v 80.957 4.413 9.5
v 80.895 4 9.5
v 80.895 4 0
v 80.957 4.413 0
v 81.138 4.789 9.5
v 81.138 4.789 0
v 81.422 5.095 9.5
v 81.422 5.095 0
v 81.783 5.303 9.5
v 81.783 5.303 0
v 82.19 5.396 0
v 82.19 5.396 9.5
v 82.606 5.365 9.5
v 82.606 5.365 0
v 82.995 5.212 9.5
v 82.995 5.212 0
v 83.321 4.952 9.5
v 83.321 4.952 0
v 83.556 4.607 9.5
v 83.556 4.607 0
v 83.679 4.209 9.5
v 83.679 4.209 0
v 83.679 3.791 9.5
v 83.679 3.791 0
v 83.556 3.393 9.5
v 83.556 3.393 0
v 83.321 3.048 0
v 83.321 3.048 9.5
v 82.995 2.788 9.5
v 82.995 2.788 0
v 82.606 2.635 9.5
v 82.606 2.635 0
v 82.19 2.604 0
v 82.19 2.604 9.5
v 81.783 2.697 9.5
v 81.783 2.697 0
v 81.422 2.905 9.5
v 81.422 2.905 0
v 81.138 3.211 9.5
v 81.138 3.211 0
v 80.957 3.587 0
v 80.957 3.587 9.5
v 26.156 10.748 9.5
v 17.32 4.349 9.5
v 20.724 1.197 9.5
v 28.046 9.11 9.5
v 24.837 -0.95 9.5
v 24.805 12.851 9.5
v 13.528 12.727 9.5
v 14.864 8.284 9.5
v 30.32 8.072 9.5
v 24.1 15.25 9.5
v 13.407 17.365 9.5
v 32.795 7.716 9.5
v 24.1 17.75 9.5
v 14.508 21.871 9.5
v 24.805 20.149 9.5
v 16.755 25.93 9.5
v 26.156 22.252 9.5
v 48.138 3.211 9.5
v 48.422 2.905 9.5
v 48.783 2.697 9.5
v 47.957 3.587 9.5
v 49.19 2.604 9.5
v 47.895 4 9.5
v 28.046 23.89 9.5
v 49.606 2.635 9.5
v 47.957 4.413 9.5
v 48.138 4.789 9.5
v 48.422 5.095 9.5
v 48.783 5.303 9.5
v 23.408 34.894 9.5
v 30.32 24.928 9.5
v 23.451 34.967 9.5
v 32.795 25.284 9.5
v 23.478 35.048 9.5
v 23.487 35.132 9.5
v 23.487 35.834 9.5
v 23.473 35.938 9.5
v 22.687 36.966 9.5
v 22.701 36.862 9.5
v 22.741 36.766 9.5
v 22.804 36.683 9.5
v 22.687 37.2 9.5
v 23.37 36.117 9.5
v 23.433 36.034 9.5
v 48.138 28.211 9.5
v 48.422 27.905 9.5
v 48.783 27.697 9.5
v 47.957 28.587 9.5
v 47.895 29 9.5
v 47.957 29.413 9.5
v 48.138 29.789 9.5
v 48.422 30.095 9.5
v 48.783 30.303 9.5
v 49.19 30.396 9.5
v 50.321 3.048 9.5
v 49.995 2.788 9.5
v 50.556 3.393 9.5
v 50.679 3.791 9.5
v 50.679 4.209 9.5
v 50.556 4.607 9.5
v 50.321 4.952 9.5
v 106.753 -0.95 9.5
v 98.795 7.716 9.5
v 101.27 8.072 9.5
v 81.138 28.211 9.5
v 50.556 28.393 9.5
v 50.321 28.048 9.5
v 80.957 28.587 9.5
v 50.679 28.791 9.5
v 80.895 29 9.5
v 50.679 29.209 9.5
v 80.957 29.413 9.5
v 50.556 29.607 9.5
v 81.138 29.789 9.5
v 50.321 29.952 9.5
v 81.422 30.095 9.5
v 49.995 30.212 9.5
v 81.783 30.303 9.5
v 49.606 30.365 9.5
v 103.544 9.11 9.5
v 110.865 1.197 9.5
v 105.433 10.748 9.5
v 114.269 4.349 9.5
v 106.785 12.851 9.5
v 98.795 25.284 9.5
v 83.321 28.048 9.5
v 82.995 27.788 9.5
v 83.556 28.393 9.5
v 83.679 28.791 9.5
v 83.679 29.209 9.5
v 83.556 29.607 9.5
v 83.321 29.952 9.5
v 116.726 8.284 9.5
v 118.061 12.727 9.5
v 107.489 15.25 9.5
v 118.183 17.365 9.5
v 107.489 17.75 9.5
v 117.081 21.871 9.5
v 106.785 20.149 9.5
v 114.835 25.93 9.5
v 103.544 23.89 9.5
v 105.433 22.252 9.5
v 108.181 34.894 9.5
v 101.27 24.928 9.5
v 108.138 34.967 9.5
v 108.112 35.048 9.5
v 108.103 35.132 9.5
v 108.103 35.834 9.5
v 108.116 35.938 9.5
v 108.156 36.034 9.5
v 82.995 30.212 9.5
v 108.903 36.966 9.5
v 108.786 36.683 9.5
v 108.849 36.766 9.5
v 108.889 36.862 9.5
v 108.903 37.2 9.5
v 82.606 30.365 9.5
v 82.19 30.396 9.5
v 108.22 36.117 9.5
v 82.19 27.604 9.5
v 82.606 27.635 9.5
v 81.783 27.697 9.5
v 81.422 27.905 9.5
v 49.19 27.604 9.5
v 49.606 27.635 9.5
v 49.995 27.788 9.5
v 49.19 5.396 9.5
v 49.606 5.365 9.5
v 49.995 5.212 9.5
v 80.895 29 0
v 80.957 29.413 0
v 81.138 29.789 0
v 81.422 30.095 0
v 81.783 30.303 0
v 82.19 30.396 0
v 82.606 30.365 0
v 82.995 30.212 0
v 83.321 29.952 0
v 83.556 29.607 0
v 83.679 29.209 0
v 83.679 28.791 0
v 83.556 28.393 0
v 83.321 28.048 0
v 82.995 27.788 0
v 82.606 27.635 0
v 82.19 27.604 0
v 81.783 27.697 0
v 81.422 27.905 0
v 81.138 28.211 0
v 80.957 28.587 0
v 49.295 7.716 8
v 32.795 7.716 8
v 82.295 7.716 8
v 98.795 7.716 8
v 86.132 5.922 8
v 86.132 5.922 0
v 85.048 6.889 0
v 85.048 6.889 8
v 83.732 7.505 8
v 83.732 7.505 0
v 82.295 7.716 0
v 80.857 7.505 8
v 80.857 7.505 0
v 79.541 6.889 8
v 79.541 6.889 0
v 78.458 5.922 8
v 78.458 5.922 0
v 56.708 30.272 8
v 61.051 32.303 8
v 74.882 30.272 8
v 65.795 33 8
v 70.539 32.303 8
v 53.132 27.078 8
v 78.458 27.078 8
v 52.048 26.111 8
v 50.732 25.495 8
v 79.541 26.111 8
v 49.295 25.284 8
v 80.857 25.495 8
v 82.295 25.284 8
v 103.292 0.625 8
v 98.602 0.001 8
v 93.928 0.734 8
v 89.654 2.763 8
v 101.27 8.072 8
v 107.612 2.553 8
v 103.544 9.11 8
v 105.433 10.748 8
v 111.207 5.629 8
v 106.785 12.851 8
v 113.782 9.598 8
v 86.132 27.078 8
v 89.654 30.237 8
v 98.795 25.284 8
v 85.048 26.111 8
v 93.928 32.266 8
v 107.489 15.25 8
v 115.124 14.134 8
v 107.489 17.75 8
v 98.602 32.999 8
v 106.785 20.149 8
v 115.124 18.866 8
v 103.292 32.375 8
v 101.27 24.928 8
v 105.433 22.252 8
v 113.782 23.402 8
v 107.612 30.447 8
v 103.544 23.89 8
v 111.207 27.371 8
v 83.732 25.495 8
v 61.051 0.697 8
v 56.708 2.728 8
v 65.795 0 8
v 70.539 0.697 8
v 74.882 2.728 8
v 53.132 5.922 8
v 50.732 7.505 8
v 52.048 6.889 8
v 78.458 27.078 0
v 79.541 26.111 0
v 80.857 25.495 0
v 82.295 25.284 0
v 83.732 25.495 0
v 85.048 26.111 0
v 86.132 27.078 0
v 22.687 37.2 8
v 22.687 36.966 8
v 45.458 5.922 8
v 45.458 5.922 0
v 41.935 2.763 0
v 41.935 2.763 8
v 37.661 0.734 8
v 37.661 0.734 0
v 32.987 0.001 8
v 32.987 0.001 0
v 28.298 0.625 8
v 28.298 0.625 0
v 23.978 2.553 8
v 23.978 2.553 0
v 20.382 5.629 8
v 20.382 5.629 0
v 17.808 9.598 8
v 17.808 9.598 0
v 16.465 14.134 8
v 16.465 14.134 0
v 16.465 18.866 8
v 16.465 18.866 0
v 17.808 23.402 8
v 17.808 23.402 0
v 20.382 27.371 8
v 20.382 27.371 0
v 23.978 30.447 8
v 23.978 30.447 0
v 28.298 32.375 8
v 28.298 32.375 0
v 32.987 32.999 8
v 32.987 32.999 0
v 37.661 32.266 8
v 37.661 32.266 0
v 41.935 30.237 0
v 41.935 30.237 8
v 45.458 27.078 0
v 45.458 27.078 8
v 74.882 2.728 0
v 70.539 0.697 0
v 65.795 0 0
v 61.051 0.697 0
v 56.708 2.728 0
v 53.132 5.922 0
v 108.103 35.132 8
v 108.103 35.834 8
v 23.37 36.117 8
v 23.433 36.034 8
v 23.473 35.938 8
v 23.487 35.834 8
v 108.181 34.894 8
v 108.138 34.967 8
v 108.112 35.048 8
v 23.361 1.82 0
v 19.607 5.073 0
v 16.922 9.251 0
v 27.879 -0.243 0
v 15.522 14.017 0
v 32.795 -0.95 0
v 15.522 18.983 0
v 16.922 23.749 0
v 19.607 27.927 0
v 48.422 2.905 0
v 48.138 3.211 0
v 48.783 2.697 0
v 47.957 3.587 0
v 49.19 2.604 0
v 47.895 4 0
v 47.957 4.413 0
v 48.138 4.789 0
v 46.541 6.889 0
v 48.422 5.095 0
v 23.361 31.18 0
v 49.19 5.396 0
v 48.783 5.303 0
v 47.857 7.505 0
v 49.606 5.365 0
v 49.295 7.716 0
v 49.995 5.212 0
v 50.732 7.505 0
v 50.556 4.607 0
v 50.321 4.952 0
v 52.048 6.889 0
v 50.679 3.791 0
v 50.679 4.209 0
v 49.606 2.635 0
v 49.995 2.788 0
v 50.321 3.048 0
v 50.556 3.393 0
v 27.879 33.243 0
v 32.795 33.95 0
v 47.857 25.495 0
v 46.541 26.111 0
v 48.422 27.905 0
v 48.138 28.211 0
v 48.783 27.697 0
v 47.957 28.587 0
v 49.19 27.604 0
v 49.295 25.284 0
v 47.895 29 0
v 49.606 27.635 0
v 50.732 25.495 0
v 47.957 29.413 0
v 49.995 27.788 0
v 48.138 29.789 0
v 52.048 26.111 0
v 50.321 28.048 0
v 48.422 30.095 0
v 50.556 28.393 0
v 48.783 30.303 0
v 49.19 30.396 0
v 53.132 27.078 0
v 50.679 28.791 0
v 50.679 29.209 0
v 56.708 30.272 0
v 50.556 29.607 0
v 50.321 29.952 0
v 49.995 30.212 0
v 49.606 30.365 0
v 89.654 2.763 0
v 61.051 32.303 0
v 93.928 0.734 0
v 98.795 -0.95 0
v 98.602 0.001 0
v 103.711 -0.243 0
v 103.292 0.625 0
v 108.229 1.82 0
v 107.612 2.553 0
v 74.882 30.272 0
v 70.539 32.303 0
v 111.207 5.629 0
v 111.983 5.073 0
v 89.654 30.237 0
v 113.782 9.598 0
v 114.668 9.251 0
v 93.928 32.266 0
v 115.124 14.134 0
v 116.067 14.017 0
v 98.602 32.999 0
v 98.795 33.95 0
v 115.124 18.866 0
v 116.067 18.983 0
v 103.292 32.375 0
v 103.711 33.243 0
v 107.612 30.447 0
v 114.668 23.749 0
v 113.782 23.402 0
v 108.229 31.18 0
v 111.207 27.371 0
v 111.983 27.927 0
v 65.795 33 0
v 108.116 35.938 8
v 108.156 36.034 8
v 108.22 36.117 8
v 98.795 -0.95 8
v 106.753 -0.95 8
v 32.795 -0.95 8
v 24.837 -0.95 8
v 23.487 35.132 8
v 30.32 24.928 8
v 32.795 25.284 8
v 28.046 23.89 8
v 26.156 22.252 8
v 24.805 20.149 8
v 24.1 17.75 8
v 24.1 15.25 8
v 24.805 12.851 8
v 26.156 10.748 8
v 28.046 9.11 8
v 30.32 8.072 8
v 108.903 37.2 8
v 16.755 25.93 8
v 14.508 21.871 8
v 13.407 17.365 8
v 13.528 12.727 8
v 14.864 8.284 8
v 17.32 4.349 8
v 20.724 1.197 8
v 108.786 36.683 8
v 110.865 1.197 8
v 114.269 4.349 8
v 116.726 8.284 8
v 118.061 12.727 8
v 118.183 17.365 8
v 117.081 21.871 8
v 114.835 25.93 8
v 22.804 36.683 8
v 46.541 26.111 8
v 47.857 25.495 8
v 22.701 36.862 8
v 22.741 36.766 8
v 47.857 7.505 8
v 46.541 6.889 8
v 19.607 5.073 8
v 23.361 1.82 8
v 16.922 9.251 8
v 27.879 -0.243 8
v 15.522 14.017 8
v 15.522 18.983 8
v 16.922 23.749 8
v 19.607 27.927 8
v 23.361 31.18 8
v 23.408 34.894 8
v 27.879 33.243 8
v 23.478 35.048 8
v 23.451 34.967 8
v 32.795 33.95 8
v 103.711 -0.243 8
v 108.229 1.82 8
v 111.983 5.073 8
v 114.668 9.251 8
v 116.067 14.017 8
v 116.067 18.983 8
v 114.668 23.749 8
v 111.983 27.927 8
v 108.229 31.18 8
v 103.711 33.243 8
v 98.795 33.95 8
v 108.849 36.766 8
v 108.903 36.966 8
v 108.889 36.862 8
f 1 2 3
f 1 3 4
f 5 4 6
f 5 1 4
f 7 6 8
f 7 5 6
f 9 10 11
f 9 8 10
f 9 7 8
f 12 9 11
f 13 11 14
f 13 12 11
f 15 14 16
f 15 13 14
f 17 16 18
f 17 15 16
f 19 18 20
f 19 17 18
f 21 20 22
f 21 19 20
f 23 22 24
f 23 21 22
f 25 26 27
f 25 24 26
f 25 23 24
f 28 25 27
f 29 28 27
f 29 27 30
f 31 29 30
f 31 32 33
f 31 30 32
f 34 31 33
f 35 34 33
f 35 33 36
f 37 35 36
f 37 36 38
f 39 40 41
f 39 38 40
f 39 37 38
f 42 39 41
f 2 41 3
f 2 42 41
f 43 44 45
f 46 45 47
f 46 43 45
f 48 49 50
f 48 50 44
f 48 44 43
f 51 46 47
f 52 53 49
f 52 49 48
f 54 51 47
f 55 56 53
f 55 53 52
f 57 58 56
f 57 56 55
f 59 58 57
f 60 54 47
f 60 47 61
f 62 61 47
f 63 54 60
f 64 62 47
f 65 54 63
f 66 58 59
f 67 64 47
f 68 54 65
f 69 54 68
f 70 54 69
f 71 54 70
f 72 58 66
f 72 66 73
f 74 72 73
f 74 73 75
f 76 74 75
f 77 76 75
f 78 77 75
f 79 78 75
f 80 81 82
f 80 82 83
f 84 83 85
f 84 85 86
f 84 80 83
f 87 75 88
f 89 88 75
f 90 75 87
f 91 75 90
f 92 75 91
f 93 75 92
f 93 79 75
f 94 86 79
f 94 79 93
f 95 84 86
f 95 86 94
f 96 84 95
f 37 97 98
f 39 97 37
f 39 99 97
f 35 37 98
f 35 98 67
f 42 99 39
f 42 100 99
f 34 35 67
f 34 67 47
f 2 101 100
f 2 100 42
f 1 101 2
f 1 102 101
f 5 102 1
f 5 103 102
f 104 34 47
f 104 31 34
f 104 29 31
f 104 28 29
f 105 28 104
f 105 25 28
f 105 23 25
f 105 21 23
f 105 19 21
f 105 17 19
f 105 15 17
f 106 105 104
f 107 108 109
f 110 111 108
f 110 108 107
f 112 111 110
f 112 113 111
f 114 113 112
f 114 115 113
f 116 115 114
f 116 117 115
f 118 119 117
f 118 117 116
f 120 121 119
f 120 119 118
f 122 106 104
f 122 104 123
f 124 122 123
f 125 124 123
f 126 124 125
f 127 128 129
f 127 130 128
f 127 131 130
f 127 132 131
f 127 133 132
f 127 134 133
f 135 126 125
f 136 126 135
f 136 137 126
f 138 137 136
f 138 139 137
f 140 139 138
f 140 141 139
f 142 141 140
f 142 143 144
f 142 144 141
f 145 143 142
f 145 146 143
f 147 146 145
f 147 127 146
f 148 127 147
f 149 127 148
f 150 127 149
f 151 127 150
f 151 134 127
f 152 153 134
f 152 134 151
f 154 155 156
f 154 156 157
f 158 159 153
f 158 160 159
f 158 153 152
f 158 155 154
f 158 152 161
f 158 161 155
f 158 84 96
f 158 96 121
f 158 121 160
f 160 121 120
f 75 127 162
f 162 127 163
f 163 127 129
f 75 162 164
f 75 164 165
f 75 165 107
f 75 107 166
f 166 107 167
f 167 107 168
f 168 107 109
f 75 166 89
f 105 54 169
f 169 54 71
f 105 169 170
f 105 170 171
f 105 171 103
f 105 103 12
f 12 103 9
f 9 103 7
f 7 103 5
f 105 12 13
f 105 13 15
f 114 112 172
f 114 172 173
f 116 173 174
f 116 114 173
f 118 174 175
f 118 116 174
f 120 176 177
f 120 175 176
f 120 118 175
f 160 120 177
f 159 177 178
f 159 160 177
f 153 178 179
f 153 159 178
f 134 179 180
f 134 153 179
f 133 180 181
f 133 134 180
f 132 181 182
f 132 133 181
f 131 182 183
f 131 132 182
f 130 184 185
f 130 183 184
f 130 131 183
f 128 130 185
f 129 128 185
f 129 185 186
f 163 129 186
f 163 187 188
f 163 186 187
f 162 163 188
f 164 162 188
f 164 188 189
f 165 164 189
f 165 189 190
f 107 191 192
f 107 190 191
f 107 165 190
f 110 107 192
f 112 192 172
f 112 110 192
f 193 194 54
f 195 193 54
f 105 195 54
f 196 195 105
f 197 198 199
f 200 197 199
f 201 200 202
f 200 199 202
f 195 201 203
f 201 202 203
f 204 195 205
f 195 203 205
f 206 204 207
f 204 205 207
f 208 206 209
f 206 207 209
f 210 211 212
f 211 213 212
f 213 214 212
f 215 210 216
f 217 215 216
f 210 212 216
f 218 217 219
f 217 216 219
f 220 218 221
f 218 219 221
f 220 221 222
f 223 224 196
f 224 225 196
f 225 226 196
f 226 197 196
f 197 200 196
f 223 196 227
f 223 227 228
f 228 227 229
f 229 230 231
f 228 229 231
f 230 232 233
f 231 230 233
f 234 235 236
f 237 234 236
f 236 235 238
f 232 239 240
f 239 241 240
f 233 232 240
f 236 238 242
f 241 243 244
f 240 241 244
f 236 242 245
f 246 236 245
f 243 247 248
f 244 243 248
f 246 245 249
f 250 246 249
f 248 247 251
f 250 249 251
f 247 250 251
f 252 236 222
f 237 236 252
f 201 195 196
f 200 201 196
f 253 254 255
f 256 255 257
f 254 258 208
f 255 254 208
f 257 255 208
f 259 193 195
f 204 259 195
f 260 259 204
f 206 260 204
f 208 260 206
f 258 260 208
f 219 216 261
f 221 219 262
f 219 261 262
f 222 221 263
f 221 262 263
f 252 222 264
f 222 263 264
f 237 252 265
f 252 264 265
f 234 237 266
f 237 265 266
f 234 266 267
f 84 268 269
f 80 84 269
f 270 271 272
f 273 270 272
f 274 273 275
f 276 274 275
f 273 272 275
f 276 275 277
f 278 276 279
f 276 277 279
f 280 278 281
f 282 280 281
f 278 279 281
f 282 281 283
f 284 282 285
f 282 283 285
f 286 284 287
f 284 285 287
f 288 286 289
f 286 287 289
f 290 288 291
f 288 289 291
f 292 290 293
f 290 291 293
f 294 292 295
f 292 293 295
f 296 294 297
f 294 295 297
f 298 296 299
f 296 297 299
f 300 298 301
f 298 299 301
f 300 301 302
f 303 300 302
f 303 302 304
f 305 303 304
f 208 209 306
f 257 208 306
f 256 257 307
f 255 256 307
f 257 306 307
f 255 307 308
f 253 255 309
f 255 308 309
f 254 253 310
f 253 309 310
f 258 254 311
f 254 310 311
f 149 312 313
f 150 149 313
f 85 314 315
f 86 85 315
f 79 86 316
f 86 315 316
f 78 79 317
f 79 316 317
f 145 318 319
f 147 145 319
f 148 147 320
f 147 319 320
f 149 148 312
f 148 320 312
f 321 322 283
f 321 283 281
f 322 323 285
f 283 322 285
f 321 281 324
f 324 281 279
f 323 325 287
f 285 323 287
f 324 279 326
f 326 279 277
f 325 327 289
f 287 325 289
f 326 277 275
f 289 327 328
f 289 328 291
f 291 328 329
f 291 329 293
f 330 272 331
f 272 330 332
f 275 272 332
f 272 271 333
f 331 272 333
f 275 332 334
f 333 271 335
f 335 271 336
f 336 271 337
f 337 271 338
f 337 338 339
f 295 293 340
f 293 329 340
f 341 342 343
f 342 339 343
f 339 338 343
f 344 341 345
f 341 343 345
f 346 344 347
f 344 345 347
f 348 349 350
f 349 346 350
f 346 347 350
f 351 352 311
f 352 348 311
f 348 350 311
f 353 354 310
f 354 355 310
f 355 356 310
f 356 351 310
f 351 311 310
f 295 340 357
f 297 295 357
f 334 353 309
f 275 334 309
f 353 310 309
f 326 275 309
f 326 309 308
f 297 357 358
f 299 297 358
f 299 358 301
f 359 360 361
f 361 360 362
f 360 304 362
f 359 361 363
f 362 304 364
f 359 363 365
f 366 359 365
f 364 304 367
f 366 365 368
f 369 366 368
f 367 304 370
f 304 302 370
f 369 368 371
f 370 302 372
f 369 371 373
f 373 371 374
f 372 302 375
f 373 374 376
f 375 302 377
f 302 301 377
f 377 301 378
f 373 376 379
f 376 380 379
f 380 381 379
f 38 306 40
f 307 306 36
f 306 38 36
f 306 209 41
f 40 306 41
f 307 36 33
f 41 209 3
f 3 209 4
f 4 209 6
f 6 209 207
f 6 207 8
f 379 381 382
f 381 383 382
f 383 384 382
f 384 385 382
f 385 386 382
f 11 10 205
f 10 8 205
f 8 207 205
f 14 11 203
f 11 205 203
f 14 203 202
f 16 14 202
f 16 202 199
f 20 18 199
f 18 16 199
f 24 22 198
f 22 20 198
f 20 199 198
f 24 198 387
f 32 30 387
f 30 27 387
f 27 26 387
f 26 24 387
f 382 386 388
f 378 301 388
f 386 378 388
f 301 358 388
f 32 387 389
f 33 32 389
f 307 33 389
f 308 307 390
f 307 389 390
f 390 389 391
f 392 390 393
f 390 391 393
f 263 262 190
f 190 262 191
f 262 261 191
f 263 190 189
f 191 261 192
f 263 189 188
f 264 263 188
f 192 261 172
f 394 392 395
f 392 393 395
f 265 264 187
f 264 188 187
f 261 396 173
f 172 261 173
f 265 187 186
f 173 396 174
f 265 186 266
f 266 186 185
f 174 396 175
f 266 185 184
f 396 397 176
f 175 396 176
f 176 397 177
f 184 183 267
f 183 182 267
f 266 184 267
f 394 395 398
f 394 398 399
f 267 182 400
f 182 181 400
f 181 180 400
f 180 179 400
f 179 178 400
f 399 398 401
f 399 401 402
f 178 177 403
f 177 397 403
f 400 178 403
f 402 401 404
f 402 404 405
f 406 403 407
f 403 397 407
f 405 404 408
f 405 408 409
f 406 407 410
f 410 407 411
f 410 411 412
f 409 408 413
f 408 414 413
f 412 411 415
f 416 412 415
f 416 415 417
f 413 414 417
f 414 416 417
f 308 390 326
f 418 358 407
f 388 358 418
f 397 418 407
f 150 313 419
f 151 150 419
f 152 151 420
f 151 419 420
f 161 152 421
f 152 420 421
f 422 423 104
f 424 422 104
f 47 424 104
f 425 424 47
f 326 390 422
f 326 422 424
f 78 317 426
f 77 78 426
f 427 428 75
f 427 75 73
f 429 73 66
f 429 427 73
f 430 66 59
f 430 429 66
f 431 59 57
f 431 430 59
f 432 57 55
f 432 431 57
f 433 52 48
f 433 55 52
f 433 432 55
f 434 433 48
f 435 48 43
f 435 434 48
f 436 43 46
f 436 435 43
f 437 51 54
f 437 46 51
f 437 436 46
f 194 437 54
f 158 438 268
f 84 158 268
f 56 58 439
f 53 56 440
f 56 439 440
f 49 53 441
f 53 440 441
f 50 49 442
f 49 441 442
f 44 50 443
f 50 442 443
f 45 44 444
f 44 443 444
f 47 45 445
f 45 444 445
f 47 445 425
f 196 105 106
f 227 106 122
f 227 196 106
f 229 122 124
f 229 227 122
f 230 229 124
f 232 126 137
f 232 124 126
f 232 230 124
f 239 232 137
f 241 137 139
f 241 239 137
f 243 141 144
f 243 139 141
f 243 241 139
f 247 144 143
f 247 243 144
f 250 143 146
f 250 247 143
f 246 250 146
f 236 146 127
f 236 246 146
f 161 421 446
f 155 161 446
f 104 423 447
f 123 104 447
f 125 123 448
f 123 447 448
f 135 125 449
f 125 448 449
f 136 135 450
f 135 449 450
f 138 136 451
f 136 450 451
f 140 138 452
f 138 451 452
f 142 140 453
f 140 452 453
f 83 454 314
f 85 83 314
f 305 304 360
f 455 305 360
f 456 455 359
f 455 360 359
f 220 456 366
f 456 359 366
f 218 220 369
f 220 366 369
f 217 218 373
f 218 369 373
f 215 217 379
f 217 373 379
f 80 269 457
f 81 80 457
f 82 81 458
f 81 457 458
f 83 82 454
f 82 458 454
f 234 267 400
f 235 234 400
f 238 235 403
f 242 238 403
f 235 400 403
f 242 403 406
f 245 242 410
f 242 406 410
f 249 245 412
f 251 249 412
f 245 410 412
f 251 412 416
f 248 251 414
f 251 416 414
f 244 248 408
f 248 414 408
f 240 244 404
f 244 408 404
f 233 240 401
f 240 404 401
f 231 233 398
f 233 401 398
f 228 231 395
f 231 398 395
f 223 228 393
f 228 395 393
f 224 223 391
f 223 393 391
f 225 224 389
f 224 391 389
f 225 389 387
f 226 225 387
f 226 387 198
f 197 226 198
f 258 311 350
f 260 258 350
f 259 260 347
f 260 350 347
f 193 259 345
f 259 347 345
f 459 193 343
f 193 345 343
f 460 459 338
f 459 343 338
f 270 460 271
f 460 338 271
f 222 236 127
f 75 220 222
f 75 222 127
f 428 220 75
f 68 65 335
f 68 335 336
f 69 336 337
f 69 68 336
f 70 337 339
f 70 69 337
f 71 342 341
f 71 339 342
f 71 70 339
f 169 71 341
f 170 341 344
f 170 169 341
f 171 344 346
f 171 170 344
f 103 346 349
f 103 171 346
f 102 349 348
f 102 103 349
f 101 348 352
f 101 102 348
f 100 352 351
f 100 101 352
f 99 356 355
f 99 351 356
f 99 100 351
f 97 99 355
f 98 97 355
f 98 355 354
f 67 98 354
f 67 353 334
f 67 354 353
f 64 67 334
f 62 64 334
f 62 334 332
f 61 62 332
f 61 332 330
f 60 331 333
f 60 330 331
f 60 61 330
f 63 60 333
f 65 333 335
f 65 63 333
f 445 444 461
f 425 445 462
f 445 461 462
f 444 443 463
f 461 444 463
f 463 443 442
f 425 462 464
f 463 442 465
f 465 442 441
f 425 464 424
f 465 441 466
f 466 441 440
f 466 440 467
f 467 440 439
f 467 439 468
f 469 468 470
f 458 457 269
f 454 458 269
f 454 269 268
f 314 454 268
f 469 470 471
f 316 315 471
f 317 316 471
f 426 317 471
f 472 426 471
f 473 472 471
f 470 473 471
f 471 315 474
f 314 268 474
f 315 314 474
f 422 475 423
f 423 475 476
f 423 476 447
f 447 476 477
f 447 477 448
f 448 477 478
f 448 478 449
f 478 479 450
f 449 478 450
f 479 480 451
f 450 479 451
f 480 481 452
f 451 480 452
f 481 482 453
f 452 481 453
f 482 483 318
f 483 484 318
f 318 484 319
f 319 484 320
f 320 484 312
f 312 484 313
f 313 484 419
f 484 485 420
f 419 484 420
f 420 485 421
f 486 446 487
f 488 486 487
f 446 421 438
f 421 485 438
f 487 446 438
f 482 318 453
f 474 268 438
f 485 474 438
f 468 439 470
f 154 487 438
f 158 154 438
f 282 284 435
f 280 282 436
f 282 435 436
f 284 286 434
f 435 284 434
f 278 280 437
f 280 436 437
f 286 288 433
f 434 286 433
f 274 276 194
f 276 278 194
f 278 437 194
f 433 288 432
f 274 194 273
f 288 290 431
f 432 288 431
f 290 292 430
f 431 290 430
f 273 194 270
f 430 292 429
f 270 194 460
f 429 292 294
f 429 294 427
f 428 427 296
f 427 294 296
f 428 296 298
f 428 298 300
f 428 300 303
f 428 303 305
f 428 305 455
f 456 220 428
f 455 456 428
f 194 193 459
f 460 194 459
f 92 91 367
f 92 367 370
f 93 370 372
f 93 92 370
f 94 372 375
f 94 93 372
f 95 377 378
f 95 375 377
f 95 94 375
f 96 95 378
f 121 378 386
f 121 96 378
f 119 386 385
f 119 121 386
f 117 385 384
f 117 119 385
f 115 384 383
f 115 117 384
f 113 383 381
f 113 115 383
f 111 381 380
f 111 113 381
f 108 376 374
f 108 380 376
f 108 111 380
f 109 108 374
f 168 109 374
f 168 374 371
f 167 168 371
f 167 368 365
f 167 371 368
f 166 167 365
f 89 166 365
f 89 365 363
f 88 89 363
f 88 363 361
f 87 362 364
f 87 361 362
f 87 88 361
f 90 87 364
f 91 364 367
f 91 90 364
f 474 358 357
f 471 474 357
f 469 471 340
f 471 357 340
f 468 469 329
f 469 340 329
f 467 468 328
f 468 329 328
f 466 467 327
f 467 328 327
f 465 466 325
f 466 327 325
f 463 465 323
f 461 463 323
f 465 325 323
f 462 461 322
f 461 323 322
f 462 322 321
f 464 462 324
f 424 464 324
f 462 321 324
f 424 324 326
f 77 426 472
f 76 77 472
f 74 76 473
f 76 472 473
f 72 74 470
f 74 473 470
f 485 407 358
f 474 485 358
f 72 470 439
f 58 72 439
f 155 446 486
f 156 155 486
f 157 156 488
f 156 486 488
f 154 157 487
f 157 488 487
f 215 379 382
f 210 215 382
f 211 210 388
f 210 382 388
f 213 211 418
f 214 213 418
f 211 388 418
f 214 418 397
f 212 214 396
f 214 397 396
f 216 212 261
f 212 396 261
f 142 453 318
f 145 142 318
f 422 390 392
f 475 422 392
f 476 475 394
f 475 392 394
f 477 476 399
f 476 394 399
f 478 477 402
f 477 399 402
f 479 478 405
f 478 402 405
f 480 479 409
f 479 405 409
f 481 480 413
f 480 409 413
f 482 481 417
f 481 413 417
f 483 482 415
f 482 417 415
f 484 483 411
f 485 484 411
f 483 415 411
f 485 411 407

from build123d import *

# Parameters (mm, degrees)
SKETCH1_R               = 1.2
BOSS_EXTRUDE1_DEPTH     = 8
BOSS_EXTRUDE2_DEPTH     = 1.5
CUT_EXTRUDE1_DEPTH      = 125.252015178
CUT_EXTRUDE1_DEPTH_BACK = 125.252015178
SKETCH3_R               = 1.4
CUT_EXTRUDE2_DEPTH      = 125.252015178
SKETCH5_W               = 117.271867341
SKETCH5_H               = 6.016252737
CUT_EXTRUDE3_DEPTH      = 125.252015178


with BuildPart() as part:
    # Sketch1 → Boss-Extrude1 (new body)
    with BuildSketch(Plane.XY):
        with BuildLine():
            Line((32.794822831, -0.95), (98.794822831, -0.95))
            ThreePointArc((98.794822831, -0.95), (116.244822831, 16.5), (98.794822831, 33.95))
            Line((98.794822831, 33.95), (32.794822831, 33.95))
            ThreePointArc((32.794822831, 33.95), (15.344822831, 16.5), (32.794822831, -0.95))
        make_face()
        with Locations((82.294822831, 29)):
            Circle(SKETCH1_R, mode=Mode.SUBTRACT)
        with Locations((49.294822831, 4)):
            Circle(SKETCH1_R, mode=Mode.SUBTRACT)
        with Locations((82.294822831, 4)):
            Circle(SKETCH1_R, mode=Mode.SUBTRACT)
        with Locations((49.294822831, 29)):
            Circle(SKETCH1_R, mode=Mode.SUBTRACT)
        with BuildLine():
            ThreePointArc((86.132032133, 5.921543981), (82.294822831, 7.715951248), (78.457613529, 5.921543981))
            ThreePointArc((78.457613529, 5.921543981), (65.794822831, 0), (53.132032133, 5.921543981))
            ThreePointArc((53.132032133, 5.921543981), (49.294822831, 7.715951248), (45.457613529, 5.921543981))
            ThreePointArc((45.457613529, 5.921543981), (16.294822831, 16.5), (45.457613529, 27.078456019))
            ThreePointArc((45.457613529, 27.078456019), (49.294822831, 25.284048752), (53.132032133, 27.078456019))
            ThreePointArc((53.132032133, 27.078456019), (65.794822831, 33), (78.457613529, 27.078456019))
            ThreePointArc((78.457613529, 27.078456019), (82.294822831, 25.284048752), (86.132032133, 27.078456019))
            ThreePointArc((86.132032133, 27.078456019), (115.294822831, 16.5), (86.132032133, 5.921543981))
        make_face(mode=Mode.SUBTRACT)
    extrude(amount=BOSS_EXTRUDE1_DEPTH)

    # Sketch2 → Boss-Extrude2 (add)
    with BuildSketch(Plane.XY.offset(8)):
        with BuildLine():
            Line((30.807257811, -2), (100.782387851, -2))
            ThreePointArc((100.782387851, -2), (116.415253744, 7.634664408), (114.834700595, 25.929885261))
            Line((114.834700595, 25.929885261), (108.181498709, 34.893826024))
            ThreePointArc((108.181498709, 34.893826024), (108.122906141, 35.006681153), (108.102694429, 35.132223401))
            Line((108.102694429, 35.132223401), (108.102694429, 35.834314575))
            ThreePointArc((108.102694429, 35.834314575), (108.133142616, 35.987387948), (108.219851717, 36.117157288))
            Line((108.219851717, 36.117157288), (108.785537142, 36.682842712))
            ThreePointArc((108.785537142, 36.682842712), (108.872246242, 36.812612052), (108.902694429, 36.965685425))
            Line((108.902694429, 36.965685425), (108.902694429, 37.2))
            Line((108.902694429, 37.2), (22.686951233, 37.2))
            Line((22.686951233, 37.2), (22.686951233, 36.965685425))
            ThreePointArc((22.686951233, 36.965685425), (22.71739942, 36.812612052), (22.80410852, 36.682842712))
            Line((22.80410852, 36.682842712), (23.369793945, 36.117157288))
            ThreePointArc((23.369793945, 36.117157288), (23.456503046, 35.987387948), (23.486951233, 35.834314575))
            Line((23.486951233, 35.834314575), (23.486951233, 35.132223401))
            ThreePointArc((23.486951233, 35.132223401), (23.466739521, 35.006681153), (23.408146952, 34.893826024))
            Line((23.408146952, 34.893826024), (16.754945067, 25.929885261))
            ThreePointArc((16.754945067, 25.929885261), (15.174391918, 7.634664408), (30.807257811, -2))
        make_face()
    extrude(amount=BOSS_EXTRUDE2_DEPTH)

    # Sketch3 → Cut-Extrude1 (cut, two sides: drawn at the far end of the back side and taken through both)
    with BuildSketch(Plane(origin=(0, 0, 8), x_dir=(-1, 0, 0), z_dir=(0, 0, -1)).offset(-CUT_EXTRUDE1_DEPTH_BACK)):
        with Locations((-49.294822831, 29)):
            Circle(SKETCH3_R)
        with Locations((-49.294822831, 4)):
            Circle(SKETCH3_R)
        with Locations((-82.294822831, 4)):
            Circle(SKETCH3_R)
        with Locations((-82.294822831, 29)):
            Circle(SKETCH3_R)
    extrude(amount=CUT_EXTRUDE1_DEPTH + CUT_EXTRUDE1_DEPTH_BACK, mode=Mode.SUBTRACT)

    # Sketch4 → Cut-Extrude2 (cut, through all)
    with BuildSketch(Plane(origin=(0, 0, 8), x_dir=(-1, 0, 0), z_dir=(0, 0, -1))):
        with BuildLine():
            Line((-98.794822831, 25.284048752), (-32.794822831, 25.284048752))
            ThreePointArc((-32.794822831, 25.284048752), (-24.010774079, 16.5), (-32.794822831, 7.715951248))
            Line((-32.794822831, 7.715951248), (-98.794822831, 7.715951248))
            ThreePointArc((-98.794822831, 7.715951248), (-107.578871583, 16.5), (-98.794822831, 25.284048752))
        make_face()
    extrude(amount=-CUT_EXTRUDE2_DEPTH, mode=Mode.SUBTRACT)

    # Sketch5 → Cut-Extrude3 (cut, through all)
    with BuildSketch(Plane(origin=(0, 0, 8), x_dir=(-1, 0, 0), z_dir=(0, 0, -1))):
        with Locations((-71.069949673, -3.958126369)):
            Rectangle(SKETCH5_W, SKETCH5_H)
    extrude(amount=-CUT_EXTRUDE3_DEPTH, mode=Mode.SUBTRACT)


solid = part.part
